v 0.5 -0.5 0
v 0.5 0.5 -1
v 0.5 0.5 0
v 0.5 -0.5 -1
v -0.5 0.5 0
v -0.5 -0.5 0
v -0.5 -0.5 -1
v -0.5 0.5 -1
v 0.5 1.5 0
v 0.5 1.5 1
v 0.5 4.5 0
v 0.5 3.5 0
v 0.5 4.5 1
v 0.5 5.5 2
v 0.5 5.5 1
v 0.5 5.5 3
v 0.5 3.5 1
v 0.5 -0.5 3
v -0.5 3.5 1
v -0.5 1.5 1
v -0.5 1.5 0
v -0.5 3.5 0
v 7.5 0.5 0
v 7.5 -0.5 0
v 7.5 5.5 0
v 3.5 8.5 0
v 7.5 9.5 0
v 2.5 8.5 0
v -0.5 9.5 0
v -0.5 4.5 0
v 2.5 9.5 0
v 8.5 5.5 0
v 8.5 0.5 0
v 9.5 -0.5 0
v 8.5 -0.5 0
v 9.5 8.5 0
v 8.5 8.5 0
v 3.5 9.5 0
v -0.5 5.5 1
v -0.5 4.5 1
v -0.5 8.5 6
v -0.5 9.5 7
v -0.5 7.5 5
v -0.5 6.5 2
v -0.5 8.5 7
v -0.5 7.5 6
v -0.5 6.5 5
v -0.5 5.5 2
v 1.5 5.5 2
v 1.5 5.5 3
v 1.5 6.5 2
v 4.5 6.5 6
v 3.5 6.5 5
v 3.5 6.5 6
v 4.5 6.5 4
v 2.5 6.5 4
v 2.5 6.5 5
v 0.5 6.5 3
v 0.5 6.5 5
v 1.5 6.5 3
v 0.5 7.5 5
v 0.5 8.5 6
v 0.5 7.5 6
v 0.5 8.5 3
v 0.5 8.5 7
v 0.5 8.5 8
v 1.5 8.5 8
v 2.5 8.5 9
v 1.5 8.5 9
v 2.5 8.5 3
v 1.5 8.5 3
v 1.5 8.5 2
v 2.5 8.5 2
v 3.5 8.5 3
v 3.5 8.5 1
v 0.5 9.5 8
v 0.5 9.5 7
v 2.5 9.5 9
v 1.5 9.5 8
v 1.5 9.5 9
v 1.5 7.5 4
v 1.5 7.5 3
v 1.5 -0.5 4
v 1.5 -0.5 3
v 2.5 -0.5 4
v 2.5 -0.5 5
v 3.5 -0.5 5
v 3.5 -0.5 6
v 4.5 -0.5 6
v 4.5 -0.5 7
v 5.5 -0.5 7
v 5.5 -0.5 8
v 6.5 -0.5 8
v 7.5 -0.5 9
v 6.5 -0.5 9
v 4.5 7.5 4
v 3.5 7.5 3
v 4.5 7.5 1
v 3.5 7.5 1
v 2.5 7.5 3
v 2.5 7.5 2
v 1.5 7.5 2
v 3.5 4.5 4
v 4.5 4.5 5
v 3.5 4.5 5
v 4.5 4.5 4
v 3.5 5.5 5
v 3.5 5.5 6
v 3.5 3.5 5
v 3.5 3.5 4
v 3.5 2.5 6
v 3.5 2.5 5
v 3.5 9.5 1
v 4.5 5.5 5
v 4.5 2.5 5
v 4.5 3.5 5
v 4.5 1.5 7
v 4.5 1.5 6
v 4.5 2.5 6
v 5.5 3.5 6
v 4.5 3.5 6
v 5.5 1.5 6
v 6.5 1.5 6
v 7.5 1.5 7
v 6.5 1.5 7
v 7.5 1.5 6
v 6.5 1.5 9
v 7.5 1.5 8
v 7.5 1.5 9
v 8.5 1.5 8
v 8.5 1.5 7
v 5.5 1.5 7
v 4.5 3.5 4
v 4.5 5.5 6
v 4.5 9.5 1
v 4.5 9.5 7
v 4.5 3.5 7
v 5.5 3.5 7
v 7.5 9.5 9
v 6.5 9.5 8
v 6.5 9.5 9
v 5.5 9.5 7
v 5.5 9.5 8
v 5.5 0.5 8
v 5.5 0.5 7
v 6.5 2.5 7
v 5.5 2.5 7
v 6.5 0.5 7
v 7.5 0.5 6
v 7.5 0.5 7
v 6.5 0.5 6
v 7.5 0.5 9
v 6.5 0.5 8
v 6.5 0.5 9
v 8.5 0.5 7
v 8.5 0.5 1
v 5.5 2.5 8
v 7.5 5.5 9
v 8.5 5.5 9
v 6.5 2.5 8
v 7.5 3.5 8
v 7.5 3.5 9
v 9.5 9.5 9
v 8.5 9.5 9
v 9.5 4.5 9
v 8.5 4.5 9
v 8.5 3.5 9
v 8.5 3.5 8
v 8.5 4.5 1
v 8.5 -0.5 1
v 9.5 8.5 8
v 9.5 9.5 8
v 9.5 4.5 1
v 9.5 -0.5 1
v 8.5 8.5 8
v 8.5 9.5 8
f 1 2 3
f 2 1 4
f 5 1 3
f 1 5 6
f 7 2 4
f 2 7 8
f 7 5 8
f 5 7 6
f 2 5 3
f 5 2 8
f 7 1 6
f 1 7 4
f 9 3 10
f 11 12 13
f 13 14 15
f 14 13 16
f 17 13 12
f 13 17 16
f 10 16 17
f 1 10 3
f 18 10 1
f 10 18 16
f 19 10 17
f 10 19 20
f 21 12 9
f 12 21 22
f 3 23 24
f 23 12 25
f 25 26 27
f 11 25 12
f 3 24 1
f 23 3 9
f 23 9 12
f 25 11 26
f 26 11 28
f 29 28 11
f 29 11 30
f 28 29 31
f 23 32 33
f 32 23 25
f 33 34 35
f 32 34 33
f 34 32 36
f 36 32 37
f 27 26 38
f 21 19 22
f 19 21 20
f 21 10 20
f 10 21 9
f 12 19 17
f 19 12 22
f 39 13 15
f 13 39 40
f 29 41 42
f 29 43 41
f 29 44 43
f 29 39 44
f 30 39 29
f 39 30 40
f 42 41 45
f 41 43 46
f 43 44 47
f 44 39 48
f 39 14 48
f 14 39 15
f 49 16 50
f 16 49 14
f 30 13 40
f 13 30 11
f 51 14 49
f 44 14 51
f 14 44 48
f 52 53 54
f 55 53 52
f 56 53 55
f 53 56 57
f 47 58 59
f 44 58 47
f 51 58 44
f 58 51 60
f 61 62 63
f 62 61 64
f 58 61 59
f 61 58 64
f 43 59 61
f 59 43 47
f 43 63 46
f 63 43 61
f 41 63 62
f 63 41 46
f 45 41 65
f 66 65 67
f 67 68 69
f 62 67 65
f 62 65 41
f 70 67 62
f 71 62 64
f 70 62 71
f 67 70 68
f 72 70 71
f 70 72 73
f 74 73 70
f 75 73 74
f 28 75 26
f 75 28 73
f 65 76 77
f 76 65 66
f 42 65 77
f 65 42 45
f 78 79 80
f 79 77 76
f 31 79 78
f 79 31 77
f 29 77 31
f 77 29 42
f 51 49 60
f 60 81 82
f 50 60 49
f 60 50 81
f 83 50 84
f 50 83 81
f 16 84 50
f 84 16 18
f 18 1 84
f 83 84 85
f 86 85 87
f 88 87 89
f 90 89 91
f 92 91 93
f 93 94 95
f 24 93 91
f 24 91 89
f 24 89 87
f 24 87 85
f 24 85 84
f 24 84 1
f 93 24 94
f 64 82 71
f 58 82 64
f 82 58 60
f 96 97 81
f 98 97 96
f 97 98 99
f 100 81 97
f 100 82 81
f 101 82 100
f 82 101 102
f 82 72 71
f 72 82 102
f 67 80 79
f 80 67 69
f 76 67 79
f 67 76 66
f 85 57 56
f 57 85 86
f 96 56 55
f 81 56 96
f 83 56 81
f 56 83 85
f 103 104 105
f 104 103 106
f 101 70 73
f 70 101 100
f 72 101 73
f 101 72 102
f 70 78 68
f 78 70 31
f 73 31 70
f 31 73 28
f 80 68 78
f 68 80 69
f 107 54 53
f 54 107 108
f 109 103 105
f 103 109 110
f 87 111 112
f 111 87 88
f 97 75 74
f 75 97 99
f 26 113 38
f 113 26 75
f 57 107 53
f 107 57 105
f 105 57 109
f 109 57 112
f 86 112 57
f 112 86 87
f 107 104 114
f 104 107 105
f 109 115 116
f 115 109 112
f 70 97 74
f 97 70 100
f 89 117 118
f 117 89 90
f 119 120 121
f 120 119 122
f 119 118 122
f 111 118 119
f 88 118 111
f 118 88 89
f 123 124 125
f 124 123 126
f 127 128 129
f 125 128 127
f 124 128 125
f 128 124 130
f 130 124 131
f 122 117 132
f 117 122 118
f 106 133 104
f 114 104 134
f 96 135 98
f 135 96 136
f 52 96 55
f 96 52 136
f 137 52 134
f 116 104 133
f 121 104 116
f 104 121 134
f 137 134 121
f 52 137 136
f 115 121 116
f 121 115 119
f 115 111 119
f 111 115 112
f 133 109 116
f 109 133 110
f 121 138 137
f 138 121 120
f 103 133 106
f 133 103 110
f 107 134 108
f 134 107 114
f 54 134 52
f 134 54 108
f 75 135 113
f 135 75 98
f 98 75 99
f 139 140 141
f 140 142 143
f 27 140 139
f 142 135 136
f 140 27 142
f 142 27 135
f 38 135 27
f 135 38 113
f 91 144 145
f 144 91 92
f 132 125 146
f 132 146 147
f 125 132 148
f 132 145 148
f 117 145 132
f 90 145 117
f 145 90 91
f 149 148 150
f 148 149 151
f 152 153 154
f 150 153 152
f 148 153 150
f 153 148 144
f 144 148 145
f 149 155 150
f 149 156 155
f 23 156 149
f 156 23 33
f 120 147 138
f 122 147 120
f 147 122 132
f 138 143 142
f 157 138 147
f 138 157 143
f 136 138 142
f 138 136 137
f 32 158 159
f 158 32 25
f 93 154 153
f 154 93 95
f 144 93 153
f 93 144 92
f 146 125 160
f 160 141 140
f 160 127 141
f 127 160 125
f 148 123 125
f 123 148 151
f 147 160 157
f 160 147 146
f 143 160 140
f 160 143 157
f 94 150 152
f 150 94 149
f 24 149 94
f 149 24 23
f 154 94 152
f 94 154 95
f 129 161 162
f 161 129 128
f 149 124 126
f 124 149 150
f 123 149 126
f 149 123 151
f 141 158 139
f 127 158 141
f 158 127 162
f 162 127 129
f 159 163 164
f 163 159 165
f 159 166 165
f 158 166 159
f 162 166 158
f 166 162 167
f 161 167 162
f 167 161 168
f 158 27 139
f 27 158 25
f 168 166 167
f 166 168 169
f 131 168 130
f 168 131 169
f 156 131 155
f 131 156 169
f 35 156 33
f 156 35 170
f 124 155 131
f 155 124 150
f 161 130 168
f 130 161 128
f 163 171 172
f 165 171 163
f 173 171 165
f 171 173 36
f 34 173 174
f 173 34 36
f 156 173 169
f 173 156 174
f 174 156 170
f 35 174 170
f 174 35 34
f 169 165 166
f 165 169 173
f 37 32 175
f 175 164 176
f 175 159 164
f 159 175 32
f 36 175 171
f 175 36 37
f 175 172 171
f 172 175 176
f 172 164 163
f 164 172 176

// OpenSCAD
union() {
    translate([0, 0, -0.5]) color([1, 0, 0]) cube([1, 1, 1], center=true);
    translate([0, 2, 0.5]) cube([1, 1, 1], center=true);
    translate([0, 3, 0.5]) cube([1, 1, 1], center=true);
    translate([0, 5, 0.5]) cube([1, 1, 1], center=true);
    translate([0, 6, 1.0]) cube([1, 1, 2], center=true);
    translate([0, 7, 2.5]) cube([1, 1, 5], center=true);
    translate([0, 8, 3.0]) cube([1, 1, 6], center=true);
    translate([0, 9, 3.5]) cube([1, 1, 7], center=true);
    translate([1, 0, 1.5]) cube([1, 1, 3], center=true);
    translate([1, 1, 1.5]) cube([1, 1, 3], center=true);
    translate([1, 2, 1.5]) cube([1, 1, 3], center=true);
    translate([1, 3, 1.5]) cube([1, 1, 3], center=true);
    translate([1, 4, 1.5]) cube([1, 1, 3], center=true);
    translate([1, 5, 1.5]) cube([1, 1, 3], center=true);
    translate([1, 6, 1.0]) cube([1, 1, 2], center=true);
    translate([1, 7, 1.5]) cube([1, 1, 3], center=true);
    translate([1, 8, 1.5]) cube([1, 1, 3], center=true);
    translate([1, 9, 4.0]) cube([1, 1, 8], center=true);
    translate([2, 0, 2.0]) cube([1, 1, 4], center=true);
    translate([2, 1, 2.0]) cube([1, 1, 4], center=true);
    translate([2, 2, 2.0]) cube([1, 1, 4], center=true);
    translate([2, 3, 2.0]) cube([1, 1, 4], center=true);
    translate([2, 4, 2.0]) cube([1, 1, 4], center=true);
    translate([2, 5, 2.0]) cube([1, 1, 4], center=true);
    translate([2, 6, 2.0]) cube([1, 1, 4], center=true);
    translate([2, 7, 2.0]) cube([1, 1, 4], center=true);
    translate([2, 8, 1.0]) cube([1, 1, 2], center=true);
    translate([2, 9, 4.5]) cube([1, 1, 9], center=true);
    translate([3, 0, 2.5]) cube([1, 1, 5], center=true);
    translate([3, 1, 2.5]) cube([1, 1, 5], center=true);
    translate([3, 2, 2.5]) cube([1, 1, 5], center=true);
    translate([3, 3, 2.5]) cube([1, 1, 5], center=true);
    translate([3, 4, 2.5]) cube([1, 1, 5], center=true);
    translate([3, 5, 2.5]) cube([1, 1, 5], center=true);
    translate([3, 6, 2.5]) cube([1, 1, 5], center=true);
    translate([3, 7, 2.0]) cube([1, 1, 4], center=true);
    translate([3, 8, 1.5]) cube([1, 1, 3], center=true);
    translate([4, 0, 3.0]) cube([1, 1, 6], center=true);
    translate([4, 1, 3.0]) cube([1, 1, 6], center=true);
    translate([4, 2, 3.0]) cube([1, 1, 6], center=true);
    translate([4, 3, 2.5]) cube([1, 1, 5], center=true);
    translate([4, 4, 2.0]) cube([1, 1, 4], center=true);
    translate([4, 5, 2.5]) cube([1, 1, 5], center=true);
    translate([4, 6, 3.0]) cube([1, 1, 6], center=true);
    translate([4, 7, 2.0]) cube([1, 1, 4], center=true);
    translate([4, 8, 0.5]) cube([1, 1, 1], center=true);
    translate([4, 9, 0.5]) cube([1, 1, 1], center=true);
    translate([5, 0, 3.5]) cube([1, 1, 7], center=true);
    translate([5, 1, 3.5]) cube([1, 1, 7], center=true);
    translate([5, 2, 3.0]) cube([1, 1, 6], center=true);
    translate([5, 3, 3.0]) cube([1, 1, 6], center=true);
    translate([5, 4, 3.5]) cube([1, 1, 7], center=true);
    translate([5, 5, 3.5]) cube([1, 1, 7], center=true);
    translate([5, 6, 3.5]) cube([1, 1, 7], center=true);
    translate([5, 7, 3.5]) cube([1, 1, 7], center=true);
    translate([5, 8, 3.5]) cube([1, 1, 7], center=true);
    translate([5, 9, 3.5]) cube([1, 1, 7], center=true);
    translate([6, 0, 4.0]) cube([1, 1, 8], center=true);
    translate([6, 1, 3.5]) cube([1, 1, 7], center=true);
    translate([6, 2, 3.5]) cube([1, 1, 7], center=true);
    translate([6, 3, 4.0]) cube([1, 1, 8], center=true);
    translate([6, 4, 4.0]) cube([1, 1, 8], center=true);
    translate([6, 5, 4.0]) cube([1, 1, 8], center=true);
    translate([6, 6, 4.0]) cube([1, 1, 8], center=true);
    translate([6, 7, 4.0]) cube([1, 1, 8], center=true);
    translate([6, 8, 4.0]) cube([1, 1, 8], center=true);
    translate([6, 9, 4.0]) cube([1, 1, 8], center=true);
    translate([7, 0, 4.5]) cube([1, 1, 9], center=true);
    translate([7, 1, 3.0]) cube([1, 1, 6], center=true);
    translate([7, 2, 4.5]) cube([1, 1, 9], center=true);
    translate([7, 3, 4.5]) cube([1, 1, 9], center=true);
    translate([7, 4, 4.5]) cube([1, 1, 9], center=true);
    translate([7, 5, 4.5]) cube([1, 1, 9], center=true);
    translate([7, 6, 4.5]) cube([1, 1, 9], center=true);
    translate([7, 7, 4.5]) cube([1, 1, 9], center=true);
    translate([7, 8, 4.5]) cube([1, 1, 9], center=true);
    translate([7, 9, 4.5]) cube([1, 1, 9], center=true);
    translate([8, 1, 3.5]) cube([1, 1, 7], center=true);
    translate([8, 2, 4.0]) cube([1, 1, 8], center=true);
    translate([8, 3, 4.0]) cube([1, 1, 8], center=true);
    translate([8, 4, 4.5]) cube([1, 1, 9], center=true);
    translate([8, 5, 4.5]) cube([1, 1, 9], center=true);
    translate([9, 0, 0.5]) cube([1, 1, 1], center=true);
    translate([9, 1, 0.5]) cube([1, 1, 1], center=true);
    translate([9, 2, 0.5]) cube([1, 1, 1], center=true);
    translate([9, 3, 0.5]) cube([1, 1, 1], center=true);
    translate([9, 4, 0.5]) cube([1, 1, 1], center=true);
    translate([9, 5, 4.5]) cube([1, 1, 9], center=true);
    translate([9, 6, 4.5]) cube([1, 1, 9], center=true);
    translate([9, 7, 4.5]) cube([1, 1, 9], center=true);
    translate([9, 8, 4.5]) cube([1, 1, 9], center=true);
    translate([9, 9, 8.5]) color([0, 0, 1]) cube([1, 1, 1], center=true);
}
